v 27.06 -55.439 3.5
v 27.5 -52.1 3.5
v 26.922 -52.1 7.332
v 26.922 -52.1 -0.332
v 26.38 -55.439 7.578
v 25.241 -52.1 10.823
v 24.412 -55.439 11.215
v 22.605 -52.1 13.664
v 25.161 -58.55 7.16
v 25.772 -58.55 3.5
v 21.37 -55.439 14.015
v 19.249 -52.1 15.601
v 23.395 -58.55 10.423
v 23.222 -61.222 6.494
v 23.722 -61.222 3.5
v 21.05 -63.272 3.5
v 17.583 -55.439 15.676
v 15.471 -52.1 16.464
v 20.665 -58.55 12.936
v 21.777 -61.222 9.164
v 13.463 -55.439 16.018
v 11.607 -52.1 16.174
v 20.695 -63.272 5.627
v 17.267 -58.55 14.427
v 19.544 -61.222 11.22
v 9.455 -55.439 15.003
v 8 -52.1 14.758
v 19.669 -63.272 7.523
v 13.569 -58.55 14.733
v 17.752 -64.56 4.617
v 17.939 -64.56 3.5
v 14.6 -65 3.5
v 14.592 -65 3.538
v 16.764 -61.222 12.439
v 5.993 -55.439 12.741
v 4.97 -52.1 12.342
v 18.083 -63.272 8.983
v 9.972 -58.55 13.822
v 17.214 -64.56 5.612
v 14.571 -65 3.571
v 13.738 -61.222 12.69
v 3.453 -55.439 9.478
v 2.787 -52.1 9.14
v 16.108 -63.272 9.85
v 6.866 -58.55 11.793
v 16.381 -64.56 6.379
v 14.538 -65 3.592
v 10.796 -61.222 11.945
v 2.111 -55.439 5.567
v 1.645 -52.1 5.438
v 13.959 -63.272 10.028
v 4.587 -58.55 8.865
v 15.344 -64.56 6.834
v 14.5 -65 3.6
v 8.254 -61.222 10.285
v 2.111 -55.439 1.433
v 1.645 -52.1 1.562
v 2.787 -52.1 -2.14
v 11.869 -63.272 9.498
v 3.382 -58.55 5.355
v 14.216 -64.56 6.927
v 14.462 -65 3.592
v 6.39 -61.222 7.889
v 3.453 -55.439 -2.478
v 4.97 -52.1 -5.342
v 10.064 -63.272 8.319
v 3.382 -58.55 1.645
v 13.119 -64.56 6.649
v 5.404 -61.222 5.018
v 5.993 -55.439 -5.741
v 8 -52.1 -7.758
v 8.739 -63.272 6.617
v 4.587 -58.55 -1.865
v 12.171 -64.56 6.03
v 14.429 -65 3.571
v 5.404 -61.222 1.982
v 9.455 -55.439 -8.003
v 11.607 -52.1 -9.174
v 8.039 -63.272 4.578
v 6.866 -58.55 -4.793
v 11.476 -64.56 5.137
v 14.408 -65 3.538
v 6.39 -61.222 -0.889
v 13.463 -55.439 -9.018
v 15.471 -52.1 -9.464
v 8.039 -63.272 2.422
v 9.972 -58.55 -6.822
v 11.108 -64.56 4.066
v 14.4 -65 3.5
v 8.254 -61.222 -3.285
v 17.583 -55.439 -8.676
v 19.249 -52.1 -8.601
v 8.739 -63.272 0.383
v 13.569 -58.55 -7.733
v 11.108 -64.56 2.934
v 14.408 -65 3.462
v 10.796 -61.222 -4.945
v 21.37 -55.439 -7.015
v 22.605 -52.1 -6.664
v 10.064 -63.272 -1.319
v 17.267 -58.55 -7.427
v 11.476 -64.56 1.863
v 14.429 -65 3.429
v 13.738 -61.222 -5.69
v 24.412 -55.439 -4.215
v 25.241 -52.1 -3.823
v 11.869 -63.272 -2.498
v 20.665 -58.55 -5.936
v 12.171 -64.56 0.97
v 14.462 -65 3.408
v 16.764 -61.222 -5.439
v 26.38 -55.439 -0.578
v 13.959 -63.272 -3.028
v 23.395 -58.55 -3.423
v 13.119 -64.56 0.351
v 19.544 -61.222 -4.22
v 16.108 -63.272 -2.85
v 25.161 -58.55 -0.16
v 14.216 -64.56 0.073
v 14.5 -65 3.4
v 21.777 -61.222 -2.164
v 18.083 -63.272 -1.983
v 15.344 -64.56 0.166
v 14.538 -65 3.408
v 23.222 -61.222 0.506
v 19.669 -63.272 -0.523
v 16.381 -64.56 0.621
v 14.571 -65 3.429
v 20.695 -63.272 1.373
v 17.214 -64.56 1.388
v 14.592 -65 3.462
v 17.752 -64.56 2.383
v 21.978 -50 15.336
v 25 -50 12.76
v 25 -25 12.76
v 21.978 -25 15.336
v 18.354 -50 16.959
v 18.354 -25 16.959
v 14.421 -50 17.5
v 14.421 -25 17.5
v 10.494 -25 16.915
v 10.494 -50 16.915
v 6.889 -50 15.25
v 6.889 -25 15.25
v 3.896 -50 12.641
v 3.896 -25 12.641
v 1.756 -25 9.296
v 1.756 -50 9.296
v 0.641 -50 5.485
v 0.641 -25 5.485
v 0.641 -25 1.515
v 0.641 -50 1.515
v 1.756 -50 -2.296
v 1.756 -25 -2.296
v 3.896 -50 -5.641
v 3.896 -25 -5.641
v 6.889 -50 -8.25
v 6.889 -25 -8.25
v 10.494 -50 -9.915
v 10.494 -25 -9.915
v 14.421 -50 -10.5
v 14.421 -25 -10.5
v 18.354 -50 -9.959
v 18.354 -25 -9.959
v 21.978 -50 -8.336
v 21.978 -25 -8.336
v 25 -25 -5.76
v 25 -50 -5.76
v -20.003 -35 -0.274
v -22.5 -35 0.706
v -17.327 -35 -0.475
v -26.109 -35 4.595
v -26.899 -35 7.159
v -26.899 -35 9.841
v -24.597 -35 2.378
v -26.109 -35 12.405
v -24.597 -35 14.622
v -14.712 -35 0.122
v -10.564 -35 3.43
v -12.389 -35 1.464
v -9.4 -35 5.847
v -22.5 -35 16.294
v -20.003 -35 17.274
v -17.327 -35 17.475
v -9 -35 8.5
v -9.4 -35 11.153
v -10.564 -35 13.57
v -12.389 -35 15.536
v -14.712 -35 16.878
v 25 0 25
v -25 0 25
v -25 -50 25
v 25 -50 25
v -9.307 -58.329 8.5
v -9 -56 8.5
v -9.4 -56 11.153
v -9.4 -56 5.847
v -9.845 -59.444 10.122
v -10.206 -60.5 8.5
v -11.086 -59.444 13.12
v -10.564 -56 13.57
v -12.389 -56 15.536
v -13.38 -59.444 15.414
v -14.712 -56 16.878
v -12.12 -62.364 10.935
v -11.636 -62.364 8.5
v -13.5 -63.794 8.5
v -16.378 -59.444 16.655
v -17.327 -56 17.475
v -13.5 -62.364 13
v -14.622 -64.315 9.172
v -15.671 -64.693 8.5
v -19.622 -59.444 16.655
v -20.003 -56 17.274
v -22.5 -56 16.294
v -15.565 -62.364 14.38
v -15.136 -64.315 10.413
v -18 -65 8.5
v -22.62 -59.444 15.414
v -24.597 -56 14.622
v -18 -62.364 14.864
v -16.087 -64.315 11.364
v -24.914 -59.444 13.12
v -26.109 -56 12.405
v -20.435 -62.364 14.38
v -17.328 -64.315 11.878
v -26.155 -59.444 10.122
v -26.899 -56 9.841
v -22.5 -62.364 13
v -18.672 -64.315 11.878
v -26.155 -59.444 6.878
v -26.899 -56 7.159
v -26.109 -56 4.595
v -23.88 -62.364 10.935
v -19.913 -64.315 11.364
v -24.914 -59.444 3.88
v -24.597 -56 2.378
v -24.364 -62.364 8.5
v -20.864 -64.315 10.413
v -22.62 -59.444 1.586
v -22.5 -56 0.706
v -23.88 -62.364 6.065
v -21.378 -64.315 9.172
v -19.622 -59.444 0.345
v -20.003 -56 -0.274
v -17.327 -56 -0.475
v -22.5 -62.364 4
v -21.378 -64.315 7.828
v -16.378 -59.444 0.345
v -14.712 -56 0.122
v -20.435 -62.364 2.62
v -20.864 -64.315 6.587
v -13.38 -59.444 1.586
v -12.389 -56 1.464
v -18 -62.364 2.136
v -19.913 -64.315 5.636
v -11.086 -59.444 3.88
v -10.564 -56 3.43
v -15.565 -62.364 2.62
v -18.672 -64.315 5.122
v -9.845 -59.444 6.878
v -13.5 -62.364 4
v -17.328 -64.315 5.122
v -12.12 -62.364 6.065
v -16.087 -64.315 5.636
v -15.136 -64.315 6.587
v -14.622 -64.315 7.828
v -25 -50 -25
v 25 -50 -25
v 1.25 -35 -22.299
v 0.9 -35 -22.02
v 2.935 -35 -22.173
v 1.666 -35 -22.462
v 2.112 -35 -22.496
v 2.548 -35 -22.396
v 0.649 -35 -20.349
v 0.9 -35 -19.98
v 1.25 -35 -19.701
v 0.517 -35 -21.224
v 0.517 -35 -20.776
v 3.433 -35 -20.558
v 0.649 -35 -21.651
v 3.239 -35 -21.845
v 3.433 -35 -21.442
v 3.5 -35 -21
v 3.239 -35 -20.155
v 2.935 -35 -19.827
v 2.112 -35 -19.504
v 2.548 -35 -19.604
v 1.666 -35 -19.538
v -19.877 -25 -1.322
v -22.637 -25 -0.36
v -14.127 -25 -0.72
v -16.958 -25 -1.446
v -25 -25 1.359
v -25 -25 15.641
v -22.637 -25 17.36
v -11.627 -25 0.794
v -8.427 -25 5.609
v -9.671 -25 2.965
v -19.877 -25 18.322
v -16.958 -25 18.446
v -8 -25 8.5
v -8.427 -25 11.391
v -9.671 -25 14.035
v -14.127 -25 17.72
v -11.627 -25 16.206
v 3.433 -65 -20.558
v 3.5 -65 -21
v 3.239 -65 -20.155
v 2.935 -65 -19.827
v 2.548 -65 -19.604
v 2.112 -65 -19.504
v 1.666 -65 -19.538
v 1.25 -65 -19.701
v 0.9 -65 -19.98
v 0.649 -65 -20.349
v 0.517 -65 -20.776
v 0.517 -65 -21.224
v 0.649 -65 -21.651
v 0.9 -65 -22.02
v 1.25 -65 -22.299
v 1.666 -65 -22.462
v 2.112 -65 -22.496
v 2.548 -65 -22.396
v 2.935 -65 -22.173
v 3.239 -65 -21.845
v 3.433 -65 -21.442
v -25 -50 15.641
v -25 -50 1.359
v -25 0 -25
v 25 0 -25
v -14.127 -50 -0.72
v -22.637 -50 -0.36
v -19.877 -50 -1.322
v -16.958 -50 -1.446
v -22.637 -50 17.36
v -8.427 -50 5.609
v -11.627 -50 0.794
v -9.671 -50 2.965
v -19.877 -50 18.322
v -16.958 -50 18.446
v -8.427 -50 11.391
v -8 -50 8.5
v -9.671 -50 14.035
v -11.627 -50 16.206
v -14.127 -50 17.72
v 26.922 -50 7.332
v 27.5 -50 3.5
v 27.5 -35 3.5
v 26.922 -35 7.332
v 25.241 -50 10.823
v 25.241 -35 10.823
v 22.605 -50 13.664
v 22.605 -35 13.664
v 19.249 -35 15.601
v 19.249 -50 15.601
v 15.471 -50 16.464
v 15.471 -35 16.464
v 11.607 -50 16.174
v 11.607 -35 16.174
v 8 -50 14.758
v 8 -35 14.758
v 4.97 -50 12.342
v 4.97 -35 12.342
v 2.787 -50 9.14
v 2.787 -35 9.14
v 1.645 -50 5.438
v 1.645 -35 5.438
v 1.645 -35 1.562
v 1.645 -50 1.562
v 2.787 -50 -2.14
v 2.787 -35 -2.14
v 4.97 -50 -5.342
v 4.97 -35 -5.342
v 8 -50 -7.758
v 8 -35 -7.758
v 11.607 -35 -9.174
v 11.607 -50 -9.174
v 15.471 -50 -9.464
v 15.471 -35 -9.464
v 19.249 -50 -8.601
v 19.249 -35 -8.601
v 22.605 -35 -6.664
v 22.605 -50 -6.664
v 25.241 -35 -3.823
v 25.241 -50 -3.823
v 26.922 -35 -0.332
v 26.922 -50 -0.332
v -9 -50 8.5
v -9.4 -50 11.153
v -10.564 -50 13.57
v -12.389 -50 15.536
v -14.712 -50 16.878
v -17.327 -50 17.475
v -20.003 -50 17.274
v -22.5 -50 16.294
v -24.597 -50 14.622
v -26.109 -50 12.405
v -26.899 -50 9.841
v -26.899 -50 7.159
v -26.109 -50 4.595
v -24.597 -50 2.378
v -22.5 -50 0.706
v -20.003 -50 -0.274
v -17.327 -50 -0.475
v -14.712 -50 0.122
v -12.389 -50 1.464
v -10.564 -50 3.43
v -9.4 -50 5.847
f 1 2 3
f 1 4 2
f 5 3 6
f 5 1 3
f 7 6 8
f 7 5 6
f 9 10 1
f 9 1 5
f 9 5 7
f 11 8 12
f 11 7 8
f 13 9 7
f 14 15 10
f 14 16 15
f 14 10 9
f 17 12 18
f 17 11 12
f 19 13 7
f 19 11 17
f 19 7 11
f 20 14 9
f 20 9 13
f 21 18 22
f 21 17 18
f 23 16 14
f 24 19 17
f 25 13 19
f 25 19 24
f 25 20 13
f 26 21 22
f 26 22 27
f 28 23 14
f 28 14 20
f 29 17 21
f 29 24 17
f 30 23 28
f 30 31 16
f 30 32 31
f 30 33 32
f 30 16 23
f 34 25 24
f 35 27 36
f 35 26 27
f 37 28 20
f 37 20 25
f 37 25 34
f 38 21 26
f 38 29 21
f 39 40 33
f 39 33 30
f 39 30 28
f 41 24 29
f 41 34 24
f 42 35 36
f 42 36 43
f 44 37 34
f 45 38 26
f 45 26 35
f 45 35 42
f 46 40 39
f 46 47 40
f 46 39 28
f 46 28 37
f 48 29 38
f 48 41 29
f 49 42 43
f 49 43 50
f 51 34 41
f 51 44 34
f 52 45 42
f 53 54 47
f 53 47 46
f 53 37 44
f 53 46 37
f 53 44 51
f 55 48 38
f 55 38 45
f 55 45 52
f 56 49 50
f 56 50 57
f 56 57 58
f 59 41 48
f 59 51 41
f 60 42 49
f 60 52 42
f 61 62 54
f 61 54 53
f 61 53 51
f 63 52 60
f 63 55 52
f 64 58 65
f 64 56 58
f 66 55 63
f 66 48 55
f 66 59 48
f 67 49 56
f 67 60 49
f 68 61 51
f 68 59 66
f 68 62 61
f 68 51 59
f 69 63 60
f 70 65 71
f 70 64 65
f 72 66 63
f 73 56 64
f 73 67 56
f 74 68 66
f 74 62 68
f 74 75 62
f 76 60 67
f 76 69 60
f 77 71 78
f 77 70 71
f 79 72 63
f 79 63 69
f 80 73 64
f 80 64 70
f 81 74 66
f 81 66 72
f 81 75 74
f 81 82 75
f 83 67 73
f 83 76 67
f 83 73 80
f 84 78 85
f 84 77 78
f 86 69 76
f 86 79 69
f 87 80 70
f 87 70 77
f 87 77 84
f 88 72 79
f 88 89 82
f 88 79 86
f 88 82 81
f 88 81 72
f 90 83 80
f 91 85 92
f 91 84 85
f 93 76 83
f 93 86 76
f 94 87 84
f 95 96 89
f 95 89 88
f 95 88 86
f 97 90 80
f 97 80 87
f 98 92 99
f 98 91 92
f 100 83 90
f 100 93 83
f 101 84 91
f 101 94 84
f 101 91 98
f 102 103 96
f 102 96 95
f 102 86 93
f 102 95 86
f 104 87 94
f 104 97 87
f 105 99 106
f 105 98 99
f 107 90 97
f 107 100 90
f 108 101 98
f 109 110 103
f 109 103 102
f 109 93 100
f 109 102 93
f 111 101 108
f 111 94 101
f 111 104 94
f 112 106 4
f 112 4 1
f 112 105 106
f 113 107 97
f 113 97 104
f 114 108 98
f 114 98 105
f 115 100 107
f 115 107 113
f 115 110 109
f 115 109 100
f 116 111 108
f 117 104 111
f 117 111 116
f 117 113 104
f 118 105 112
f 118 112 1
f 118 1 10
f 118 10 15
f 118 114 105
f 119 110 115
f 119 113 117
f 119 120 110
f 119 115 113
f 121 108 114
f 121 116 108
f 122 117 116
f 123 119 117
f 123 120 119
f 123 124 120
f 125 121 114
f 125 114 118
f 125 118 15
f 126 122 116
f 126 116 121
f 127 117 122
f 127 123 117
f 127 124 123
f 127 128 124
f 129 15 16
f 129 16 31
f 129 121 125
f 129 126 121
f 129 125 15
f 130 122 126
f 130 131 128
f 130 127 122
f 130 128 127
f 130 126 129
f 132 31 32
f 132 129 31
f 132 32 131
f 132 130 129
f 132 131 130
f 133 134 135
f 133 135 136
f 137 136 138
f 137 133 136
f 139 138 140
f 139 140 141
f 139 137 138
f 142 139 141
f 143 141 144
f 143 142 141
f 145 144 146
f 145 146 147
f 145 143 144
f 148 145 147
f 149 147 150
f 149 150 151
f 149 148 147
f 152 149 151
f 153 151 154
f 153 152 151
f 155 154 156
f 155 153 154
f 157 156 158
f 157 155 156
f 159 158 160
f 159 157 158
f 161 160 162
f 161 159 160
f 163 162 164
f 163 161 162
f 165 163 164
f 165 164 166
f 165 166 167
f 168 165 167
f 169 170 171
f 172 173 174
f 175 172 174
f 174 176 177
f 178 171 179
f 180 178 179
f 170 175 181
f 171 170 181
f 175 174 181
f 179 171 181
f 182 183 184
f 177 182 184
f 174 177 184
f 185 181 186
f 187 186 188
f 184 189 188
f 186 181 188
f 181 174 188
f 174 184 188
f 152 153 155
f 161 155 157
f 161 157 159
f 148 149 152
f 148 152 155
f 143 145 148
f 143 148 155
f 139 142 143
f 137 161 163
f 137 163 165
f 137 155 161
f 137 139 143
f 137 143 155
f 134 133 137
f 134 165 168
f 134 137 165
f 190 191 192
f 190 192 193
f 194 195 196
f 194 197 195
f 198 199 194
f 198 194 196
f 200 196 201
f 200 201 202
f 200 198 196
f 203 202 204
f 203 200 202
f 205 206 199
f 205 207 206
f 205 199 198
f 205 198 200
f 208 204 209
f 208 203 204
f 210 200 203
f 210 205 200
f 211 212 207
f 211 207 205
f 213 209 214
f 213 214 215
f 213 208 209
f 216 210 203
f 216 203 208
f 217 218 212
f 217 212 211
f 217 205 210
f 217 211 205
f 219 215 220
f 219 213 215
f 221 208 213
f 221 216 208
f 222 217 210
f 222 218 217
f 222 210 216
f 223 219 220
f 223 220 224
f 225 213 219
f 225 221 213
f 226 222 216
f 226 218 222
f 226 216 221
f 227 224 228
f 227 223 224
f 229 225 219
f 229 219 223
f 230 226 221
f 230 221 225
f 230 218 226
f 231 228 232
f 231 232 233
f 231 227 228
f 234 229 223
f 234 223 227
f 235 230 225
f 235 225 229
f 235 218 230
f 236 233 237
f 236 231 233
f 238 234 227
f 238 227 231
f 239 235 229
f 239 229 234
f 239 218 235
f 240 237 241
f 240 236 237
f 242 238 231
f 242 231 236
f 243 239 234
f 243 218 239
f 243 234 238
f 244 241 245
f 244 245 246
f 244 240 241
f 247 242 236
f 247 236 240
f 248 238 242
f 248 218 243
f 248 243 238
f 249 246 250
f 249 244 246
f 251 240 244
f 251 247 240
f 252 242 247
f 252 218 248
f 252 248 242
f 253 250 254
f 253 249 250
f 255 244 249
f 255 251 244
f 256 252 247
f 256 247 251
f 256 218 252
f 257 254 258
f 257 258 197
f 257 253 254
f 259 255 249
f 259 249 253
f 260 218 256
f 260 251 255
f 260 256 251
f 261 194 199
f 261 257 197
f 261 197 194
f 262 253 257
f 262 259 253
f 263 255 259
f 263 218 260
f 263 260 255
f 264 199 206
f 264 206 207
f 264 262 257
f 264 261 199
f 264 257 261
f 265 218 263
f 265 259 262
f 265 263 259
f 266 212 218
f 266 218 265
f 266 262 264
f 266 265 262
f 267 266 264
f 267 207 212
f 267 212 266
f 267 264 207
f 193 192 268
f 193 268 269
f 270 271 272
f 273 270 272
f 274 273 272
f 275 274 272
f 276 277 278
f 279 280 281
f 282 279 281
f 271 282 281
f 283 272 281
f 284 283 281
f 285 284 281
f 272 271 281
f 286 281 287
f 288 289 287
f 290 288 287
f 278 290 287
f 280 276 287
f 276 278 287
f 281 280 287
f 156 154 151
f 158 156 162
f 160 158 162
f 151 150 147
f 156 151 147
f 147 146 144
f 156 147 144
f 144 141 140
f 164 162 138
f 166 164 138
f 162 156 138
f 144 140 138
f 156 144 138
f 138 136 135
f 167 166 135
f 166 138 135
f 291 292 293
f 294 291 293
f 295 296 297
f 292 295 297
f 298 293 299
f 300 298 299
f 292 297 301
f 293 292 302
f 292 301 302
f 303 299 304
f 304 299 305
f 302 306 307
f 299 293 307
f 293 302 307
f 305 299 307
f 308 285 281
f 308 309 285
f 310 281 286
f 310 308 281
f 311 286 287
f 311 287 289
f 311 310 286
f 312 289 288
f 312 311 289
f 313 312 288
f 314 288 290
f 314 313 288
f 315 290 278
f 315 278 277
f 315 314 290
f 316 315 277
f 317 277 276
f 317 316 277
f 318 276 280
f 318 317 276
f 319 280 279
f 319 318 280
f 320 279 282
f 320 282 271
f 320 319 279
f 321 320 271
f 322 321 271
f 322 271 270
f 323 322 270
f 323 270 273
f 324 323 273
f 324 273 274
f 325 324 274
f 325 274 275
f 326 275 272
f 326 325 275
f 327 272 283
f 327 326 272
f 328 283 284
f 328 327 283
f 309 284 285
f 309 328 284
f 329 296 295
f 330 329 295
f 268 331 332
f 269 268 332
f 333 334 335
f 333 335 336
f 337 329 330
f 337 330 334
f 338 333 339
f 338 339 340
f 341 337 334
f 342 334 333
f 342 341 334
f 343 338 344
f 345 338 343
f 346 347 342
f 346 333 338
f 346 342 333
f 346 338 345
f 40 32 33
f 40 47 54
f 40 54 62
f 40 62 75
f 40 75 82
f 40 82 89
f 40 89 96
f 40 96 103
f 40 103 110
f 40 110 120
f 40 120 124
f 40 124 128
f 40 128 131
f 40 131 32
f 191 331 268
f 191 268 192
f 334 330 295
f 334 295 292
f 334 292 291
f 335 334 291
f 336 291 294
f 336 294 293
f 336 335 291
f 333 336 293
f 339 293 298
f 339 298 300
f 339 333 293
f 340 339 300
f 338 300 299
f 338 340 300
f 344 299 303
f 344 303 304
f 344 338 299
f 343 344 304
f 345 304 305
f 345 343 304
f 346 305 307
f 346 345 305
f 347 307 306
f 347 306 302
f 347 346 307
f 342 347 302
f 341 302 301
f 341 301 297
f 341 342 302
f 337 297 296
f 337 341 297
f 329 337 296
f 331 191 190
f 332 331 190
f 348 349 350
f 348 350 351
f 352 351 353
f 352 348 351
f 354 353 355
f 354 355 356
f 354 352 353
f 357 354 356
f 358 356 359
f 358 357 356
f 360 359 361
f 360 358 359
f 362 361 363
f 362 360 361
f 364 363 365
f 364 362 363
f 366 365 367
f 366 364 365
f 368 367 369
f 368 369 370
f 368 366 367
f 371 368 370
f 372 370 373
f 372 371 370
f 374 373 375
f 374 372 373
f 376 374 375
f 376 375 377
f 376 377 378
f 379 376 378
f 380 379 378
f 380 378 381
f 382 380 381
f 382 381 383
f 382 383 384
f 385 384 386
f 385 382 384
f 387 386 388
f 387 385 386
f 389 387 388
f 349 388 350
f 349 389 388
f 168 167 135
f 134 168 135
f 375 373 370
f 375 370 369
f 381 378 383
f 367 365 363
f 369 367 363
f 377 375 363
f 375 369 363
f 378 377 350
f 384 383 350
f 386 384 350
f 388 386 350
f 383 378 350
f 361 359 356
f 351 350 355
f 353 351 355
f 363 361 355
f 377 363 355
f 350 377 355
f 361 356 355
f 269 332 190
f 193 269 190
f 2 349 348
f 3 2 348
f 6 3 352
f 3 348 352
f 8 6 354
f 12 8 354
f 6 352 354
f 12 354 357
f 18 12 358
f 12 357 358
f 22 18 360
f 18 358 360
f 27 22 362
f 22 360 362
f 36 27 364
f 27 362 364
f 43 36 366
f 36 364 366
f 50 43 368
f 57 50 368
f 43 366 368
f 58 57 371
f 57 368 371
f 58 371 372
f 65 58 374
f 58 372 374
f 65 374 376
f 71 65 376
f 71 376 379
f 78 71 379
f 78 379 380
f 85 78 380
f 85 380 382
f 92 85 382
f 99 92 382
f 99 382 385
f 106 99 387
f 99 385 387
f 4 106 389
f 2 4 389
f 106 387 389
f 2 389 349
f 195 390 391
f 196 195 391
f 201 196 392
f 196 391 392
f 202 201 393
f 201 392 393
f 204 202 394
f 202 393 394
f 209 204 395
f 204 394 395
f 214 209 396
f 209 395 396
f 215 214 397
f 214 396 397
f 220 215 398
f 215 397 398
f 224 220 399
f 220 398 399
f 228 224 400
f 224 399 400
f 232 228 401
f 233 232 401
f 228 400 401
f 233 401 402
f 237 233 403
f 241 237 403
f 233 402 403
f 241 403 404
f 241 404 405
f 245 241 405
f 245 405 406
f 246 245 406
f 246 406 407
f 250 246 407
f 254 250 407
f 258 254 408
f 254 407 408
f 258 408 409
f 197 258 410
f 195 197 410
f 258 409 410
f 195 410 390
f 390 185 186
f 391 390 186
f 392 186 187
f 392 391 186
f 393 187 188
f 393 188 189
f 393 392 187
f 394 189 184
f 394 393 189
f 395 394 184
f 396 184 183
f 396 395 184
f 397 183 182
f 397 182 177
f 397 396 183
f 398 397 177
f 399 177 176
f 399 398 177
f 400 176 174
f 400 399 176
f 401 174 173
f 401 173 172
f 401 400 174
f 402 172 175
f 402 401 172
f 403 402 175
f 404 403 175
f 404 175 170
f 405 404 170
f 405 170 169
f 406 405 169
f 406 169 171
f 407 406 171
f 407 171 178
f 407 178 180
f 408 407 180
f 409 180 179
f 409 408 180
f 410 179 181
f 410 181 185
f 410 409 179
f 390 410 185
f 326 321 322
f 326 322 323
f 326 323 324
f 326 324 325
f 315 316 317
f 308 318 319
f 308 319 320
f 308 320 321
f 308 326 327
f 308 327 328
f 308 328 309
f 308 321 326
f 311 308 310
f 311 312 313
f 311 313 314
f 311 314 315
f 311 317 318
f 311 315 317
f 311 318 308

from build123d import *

# Parameters (mm, degrees)
F0_W     = 50
F0_H     = 50
F1_DEPTH = 50
F2_R     = 9
F2_R_2   = 13
F2_R_3   = 1.5
F3_DEPTH = 15
F5_DEPTH = 25
F6_R     = 12.9
F7_R     = 9


with BuildPart() as f1:
    # F0 (on Front) → F1 (new body)
    with BuildSketch(Plane.XZ):
        Rectangle(F0_W, F0_H)
    extrude(amount=F1_DEPTH)


with BuildPart() as f3:
    # F2 (on face) → F3 (new body, symmetric)
    with BuildSketch(Plane.XZ.offset(50)):
        with Locations((-18, 8.5)):
            Circle(F2_R)
        with Locations((14.5, 3.5)):
            Circle(F2_R_2)
        with Locations((2, -21)):
            Circle(F2_R_3)
    extrude(amount=F3_DEPTH, both=True)

    # F6
    f6_edges = [f3.edges().sort_by_distance(p)[0] for p in [
        (1.5, -65, 3.5),
    ]]
    fillet(f6_edges, radius=F6_R)

    # F7
    f7_edges = [f3.edges().sort_by_distance(p)[0] for p in [
        (-27, -65, 8.5),
    ]]
    fillet(f7_edges, radius=F7_R)


with BuildPart() as f5:
    # F4 (on face) → F5 (new body)
    with BuildSketch(Plane.XZ.offset(50)):
        with BuildLine():
            Line((-25, 15.641428), (-25, 1.358572))
            ThreePointArc((-25, 1.358572), (-8, 8.5), (-25, 15.641428))
        make_face()
        with BuildLine():
            Line((25, -5.76013), (25, 12.76013))
            ThreePointArc((25, 12.76013), (0.5, 3.5), (25, -5.76013))
        make_face()
    extrude(amount=-F5_DEPTH)


solid = Compound([f1.part, f3.part, f5.part])
